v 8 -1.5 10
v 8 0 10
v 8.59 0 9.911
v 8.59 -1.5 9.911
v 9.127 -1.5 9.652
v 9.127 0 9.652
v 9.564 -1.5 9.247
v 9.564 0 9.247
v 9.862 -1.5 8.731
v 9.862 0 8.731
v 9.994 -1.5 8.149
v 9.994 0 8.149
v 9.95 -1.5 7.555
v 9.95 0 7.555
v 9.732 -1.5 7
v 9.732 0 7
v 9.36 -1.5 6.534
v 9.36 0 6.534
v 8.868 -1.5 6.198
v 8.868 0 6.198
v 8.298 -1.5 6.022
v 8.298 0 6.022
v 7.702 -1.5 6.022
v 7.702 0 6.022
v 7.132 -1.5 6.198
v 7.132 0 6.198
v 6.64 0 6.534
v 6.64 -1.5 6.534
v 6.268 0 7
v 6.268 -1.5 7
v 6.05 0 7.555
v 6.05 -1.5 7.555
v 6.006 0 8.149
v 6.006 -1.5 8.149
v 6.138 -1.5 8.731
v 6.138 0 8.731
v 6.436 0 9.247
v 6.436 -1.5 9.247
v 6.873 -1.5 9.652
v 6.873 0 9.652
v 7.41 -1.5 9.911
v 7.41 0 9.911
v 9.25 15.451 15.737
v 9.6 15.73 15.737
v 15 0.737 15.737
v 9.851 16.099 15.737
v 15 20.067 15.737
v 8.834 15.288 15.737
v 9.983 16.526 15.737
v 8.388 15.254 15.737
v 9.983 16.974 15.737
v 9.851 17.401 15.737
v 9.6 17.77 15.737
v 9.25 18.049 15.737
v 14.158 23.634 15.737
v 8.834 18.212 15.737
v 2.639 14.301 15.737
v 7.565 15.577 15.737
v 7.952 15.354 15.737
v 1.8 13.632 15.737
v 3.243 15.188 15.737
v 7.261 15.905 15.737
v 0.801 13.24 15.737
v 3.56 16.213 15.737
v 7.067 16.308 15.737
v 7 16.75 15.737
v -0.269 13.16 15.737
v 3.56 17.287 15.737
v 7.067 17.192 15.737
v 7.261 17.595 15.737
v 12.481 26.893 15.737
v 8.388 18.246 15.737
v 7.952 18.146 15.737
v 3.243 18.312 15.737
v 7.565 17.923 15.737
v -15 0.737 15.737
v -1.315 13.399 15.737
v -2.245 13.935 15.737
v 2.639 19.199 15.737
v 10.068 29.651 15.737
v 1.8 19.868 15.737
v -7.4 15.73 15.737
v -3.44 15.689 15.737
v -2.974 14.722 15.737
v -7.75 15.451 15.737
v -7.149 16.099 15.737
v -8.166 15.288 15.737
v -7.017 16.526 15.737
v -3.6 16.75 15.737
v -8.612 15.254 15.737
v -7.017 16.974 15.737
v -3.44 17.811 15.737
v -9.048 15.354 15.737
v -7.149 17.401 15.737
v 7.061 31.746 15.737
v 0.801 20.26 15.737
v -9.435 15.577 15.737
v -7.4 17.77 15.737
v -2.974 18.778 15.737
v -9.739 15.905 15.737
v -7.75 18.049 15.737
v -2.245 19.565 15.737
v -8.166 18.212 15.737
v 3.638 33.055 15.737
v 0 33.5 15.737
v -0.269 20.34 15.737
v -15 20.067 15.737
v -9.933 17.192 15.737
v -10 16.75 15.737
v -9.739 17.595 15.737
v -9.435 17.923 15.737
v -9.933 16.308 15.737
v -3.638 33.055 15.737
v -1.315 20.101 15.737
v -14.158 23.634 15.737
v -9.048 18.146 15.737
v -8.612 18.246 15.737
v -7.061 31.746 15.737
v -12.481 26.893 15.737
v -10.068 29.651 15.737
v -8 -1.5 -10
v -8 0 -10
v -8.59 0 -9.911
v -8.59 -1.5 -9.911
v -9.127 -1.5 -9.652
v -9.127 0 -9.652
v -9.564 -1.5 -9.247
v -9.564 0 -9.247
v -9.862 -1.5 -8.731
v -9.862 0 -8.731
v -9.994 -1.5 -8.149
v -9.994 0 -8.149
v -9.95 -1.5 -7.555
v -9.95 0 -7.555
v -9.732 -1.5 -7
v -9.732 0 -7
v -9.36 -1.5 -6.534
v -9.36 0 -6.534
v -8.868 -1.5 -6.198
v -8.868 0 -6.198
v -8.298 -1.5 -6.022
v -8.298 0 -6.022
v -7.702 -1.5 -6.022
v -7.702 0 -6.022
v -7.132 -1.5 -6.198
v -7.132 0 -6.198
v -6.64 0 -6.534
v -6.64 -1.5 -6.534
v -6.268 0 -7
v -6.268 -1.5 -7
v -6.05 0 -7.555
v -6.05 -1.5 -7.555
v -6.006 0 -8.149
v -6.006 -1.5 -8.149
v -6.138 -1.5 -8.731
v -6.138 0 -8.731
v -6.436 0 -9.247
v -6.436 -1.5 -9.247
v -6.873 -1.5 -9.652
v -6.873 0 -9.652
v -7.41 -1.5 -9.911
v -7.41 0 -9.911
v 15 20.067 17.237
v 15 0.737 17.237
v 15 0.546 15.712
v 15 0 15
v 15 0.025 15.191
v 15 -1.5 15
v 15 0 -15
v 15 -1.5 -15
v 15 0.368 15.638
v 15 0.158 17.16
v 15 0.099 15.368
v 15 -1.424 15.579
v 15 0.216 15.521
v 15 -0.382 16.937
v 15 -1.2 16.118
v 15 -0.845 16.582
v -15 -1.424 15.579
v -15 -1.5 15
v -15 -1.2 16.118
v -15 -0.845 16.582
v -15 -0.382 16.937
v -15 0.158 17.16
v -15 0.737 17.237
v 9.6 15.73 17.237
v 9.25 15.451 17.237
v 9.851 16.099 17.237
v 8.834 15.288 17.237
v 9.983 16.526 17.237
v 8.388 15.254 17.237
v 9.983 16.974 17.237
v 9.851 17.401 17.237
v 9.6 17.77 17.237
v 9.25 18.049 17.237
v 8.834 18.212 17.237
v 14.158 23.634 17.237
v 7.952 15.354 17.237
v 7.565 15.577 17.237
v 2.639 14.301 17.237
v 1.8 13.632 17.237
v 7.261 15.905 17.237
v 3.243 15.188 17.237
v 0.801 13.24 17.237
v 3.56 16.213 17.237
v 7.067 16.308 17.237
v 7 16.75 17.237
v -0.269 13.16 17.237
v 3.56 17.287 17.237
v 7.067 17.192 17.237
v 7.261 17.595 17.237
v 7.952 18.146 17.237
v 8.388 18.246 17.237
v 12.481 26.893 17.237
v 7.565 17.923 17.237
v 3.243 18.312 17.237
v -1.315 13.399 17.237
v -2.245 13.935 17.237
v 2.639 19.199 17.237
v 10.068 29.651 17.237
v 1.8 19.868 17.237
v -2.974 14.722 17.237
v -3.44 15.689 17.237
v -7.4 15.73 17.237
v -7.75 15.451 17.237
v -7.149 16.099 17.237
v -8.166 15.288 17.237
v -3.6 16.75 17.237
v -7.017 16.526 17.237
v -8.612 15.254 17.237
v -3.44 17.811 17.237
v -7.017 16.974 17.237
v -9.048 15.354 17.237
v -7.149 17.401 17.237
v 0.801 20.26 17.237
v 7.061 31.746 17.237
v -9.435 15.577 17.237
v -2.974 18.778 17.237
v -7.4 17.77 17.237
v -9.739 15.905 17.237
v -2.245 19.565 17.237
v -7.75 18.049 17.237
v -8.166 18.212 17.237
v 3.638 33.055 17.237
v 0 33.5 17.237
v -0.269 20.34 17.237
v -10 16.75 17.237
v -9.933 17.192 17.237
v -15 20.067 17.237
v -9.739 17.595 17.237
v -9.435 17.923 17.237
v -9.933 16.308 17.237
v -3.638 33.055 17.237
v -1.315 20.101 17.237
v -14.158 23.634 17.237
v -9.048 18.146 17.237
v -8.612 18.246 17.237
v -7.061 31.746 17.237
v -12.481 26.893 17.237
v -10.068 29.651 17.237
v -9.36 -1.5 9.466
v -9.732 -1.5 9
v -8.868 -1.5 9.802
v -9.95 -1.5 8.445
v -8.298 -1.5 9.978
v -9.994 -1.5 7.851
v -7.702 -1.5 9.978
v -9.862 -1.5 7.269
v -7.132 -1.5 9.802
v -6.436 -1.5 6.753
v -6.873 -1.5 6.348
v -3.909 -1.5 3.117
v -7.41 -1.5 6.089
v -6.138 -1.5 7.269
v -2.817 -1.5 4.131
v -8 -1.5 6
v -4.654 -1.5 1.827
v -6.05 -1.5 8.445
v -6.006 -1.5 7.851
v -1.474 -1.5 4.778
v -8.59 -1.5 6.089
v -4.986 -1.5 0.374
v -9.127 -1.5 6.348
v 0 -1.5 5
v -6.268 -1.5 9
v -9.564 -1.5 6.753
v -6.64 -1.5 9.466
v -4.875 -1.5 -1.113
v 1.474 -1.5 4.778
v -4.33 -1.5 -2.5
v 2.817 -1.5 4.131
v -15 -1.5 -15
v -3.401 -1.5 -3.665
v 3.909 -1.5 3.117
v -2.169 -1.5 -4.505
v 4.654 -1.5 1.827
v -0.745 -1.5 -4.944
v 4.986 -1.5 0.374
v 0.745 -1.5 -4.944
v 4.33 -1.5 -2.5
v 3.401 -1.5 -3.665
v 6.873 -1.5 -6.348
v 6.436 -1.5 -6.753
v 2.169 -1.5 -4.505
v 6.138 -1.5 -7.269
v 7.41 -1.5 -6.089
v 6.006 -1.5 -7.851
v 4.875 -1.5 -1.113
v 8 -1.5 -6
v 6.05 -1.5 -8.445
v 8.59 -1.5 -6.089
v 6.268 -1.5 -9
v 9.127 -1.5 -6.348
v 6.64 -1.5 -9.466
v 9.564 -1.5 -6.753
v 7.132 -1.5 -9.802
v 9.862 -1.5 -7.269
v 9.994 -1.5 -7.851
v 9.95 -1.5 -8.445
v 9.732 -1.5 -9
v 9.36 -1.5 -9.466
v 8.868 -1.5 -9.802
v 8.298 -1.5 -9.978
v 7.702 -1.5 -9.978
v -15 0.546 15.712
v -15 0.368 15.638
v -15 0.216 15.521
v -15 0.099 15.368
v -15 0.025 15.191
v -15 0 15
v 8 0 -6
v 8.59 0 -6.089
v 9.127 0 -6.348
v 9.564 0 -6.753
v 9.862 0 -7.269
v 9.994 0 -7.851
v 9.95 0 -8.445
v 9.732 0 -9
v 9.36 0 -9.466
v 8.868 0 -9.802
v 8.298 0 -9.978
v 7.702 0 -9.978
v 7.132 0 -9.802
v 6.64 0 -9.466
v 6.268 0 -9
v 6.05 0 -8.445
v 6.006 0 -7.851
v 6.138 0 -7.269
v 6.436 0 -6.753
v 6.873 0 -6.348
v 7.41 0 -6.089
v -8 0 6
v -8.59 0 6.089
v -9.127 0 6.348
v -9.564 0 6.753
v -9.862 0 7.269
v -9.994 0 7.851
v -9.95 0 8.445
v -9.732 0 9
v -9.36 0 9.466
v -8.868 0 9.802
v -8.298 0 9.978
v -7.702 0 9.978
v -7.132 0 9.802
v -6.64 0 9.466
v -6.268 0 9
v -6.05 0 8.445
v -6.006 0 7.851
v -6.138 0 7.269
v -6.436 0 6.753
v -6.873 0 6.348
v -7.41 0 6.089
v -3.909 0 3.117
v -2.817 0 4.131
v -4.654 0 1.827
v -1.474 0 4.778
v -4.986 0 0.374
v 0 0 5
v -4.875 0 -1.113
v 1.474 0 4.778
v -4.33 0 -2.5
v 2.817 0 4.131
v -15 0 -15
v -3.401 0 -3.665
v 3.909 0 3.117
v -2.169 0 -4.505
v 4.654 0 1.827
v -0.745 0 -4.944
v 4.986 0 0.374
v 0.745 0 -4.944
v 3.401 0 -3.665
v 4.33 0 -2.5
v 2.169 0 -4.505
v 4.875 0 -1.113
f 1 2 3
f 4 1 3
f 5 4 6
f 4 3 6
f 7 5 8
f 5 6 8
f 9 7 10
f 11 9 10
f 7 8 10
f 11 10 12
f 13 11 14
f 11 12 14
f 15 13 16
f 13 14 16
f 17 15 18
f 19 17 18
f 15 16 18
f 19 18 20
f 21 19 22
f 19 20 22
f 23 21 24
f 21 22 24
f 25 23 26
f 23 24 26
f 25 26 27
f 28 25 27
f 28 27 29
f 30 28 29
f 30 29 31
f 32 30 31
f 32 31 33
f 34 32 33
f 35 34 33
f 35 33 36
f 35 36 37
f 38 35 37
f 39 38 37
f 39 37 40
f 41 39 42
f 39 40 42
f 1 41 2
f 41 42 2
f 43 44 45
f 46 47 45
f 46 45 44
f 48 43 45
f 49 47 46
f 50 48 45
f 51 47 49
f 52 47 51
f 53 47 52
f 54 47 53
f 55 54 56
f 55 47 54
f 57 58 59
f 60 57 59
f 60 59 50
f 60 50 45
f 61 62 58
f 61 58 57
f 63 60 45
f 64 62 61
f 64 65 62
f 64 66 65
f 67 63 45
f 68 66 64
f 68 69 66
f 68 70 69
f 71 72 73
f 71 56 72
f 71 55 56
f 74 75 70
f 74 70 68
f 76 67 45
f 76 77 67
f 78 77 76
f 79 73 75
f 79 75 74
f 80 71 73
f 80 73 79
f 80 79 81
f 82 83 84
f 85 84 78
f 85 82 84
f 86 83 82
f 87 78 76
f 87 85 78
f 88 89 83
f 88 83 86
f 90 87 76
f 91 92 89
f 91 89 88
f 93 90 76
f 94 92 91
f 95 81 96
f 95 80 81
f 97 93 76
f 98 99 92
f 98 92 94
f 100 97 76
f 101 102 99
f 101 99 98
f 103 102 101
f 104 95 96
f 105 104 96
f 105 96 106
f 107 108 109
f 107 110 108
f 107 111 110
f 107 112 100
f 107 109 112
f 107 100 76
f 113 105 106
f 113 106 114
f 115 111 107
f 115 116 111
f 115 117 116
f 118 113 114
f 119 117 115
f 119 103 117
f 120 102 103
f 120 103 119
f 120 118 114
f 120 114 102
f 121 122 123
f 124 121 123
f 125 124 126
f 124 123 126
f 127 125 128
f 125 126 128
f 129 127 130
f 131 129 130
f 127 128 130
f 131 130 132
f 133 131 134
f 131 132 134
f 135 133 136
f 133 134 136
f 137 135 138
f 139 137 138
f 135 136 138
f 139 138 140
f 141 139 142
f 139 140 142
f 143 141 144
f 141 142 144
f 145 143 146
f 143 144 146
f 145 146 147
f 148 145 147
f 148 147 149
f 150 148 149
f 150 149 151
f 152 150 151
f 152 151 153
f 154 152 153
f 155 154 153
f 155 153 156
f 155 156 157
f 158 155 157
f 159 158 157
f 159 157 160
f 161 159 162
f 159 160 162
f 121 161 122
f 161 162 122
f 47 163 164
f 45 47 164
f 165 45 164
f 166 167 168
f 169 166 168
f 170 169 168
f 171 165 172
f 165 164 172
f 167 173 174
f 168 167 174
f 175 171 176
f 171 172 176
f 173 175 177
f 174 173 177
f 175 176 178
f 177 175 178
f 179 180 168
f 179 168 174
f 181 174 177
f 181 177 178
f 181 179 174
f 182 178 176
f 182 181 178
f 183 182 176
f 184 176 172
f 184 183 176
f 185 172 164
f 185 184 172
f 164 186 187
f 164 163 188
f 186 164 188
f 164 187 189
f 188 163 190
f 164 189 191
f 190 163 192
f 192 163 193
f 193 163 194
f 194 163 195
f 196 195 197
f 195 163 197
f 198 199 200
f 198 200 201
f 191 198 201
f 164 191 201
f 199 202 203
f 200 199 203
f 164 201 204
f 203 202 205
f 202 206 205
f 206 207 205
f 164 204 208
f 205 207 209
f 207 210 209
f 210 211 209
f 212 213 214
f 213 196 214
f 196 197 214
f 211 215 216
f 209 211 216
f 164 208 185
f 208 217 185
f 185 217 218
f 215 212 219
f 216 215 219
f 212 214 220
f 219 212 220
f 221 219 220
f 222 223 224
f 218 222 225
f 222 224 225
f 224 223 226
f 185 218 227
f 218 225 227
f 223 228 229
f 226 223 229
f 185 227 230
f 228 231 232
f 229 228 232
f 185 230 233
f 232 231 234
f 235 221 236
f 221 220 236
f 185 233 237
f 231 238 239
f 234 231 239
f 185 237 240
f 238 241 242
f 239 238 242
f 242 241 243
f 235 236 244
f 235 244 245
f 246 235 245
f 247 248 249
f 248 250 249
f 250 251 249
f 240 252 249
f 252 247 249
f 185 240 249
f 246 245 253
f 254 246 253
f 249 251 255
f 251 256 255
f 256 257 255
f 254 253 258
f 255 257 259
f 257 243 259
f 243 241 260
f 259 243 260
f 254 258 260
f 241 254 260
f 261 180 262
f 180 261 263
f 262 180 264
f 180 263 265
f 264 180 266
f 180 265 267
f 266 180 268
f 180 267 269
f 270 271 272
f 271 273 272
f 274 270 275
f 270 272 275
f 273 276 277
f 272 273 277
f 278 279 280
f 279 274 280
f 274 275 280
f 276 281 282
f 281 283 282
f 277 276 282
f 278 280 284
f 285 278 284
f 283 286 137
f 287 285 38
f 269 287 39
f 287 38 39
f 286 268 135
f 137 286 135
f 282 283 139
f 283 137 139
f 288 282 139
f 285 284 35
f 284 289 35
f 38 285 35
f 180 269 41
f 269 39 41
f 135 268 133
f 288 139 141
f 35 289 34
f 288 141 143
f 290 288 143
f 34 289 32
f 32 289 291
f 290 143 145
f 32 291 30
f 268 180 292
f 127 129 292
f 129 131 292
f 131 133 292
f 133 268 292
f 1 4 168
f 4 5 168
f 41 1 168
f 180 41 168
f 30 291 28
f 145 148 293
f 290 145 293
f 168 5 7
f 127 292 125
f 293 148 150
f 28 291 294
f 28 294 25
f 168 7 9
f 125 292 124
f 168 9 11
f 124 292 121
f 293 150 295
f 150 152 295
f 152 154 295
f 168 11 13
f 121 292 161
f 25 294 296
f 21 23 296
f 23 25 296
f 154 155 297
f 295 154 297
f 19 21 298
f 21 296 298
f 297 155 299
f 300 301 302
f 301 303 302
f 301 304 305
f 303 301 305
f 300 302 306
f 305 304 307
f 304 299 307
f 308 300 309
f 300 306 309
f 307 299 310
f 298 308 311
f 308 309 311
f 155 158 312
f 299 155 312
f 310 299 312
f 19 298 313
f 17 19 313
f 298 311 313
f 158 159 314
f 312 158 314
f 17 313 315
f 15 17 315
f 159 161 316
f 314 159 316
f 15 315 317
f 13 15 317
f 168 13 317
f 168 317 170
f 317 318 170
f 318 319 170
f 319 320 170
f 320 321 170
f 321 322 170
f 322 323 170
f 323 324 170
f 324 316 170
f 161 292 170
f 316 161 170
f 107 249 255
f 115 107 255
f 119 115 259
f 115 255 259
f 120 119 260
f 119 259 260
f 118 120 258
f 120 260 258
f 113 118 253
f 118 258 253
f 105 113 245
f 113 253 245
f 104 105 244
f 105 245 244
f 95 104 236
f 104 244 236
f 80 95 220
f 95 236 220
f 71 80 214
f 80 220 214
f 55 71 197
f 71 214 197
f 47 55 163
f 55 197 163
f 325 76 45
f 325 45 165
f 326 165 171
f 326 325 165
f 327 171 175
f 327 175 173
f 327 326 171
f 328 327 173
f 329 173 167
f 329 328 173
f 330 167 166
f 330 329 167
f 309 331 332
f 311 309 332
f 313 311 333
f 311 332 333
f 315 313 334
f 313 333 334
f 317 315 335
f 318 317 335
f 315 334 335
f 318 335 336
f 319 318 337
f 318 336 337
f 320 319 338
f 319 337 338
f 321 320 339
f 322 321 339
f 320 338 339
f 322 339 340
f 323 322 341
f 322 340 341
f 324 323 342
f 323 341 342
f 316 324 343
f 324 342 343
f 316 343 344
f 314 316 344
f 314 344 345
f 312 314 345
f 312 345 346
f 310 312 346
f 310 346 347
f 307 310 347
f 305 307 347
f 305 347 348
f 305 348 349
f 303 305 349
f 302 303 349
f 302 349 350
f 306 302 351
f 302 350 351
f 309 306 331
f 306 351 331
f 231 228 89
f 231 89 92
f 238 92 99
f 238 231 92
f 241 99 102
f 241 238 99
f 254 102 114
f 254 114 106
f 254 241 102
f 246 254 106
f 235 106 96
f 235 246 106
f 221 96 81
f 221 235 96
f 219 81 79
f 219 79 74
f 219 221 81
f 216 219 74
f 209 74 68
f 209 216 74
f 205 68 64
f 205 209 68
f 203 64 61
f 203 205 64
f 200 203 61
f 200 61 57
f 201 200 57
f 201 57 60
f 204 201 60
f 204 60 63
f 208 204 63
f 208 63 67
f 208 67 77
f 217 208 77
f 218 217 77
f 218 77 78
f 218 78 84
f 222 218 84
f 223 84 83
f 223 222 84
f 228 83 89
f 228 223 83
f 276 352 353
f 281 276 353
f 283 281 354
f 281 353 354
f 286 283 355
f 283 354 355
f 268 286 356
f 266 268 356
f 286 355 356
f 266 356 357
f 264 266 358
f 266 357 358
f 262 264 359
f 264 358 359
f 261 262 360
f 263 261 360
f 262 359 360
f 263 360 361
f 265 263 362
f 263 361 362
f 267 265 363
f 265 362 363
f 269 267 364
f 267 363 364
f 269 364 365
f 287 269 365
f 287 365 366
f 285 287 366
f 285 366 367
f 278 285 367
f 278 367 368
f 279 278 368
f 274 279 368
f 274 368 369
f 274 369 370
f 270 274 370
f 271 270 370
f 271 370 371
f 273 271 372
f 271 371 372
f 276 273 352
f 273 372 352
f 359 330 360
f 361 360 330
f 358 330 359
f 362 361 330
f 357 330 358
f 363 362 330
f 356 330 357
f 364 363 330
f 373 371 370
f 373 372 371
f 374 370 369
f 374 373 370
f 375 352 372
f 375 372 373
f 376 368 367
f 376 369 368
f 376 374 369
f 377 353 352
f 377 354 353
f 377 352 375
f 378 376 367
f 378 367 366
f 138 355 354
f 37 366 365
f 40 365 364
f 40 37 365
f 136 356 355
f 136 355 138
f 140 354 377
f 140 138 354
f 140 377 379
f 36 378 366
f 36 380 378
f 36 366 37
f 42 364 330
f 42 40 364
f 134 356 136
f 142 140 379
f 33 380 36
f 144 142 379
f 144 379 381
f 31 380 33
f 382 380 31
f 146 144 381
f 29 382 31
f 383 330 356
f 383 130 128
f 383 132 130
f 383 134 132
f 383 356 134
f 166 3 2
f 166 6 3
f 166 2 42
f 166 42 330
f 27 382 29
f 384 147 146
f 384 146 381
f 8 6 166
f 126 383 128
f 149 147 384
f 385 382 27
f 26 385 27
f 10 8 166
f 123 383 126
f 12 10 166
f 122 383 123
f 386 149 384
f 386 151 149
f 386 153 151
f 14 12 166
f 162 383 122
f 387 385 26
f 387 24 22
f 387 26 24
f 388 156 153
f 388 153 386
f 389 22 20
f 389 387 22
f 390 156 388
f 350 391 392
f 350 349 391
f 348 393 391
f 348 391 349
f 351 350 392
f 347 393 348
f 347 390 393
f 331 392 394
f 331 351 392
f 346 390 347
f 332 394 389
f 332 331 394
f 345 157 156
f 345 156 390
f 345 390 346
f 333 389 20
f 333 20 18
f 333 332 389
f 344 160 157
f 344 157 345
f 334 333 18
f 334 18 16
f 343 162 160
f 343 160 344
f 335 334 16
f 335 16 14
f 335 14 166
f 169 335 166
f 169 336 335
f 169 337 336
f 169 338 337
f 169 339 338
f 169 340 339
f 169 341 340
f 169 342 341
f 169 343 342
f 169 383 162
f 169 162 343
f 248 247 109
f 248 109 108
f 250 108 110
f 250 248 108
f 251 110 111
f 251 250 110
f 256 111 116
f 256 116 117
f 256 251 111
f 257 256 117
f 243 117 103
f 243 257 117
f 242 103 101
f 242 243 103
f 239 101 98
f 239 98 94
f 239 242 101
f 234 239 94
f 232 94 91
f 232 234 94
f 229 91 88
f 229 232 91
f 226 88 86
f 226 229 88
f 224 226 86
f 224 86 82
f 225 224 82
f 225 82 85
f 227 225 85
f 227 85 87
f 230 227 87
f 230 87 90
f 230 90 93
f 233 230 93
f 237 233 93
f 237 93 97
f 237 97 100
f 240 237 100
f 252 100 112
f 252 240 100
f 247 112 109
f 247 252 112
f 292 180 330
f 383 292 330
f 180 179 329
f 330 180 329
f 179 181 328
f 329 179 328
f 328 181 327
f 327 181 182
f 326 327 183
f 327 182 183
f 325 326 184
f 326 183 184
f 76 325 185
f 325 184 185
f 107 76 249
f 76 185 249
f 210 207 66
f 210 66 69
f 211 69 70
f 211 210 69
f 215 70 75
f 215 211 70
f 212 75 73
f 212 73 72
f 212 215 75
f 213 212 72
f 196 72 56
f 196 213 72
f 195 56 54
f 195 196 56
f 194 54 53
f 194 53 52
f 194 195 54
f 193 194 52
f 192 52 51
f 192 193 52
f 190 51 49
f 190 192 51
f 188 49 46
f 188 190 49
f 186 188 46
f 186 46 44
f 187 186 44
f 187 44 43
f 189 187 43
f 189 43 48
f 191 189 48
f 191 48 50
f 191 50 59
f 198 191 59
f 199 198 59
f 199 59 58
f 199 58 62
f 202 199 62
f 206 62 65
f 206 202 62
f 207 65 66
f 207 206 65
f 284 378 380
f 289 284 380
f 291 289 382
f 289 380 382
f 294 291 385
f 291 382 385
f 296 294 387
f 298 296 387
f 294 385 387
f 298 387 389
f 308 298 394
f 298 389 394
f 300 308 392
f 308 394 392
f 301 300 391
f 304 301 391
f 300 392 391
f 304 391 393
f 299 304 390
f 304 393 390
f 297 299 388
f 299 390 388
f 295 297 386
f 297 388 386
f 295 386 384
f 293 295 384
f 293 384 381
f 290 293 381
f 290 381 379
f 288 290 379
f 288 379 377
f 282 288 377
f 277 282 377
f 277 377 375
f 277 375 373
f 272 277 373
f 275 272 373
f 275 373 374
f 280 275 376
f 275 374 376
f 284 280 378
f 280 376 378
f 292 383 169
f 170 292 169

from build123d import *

# Parameters (mm, degrees)
SKETCH1_W                = 30
SKETCH1_H                = 30
SKETCH1_R                = 5
SKETCH1_R_2              = 2
BASE_FLANGE1_DEPTH       = 1.5
EDGE_FLANGE1_DEPTH       = 30
EDGE_FLANGE1_START       = -1.5
EDGE_FLANGE1_PROFILE_R   = 1.5
EDGE_FLANGE1_PROFILE_R_2 = 3.6
EDGE_FLANGE1_FLAT_DEPTH  = 1.5


# Sheet-metal steps are written as plain solids
with BuildPart() as part:
    # Sketch1 → Base-Flange1 (new body)
    with BuildSketch(Plane(origin=(0, 0, 0), x_dir=(1, 0, 0), z_dir=(0, 1, 0))):
        Rectangle(SKETCH1_W, SKETCH1_H)
        with Locations(Location((0, 0, 0), (0, 0, 270))):
            Circle(SKETCH1_R, mode=Mode.SUBTRACT)
        with Locations(Location((8, 8, 0), (0, 0, 270))):
            Circle(SKETCH1_R_2, mode=Mode.SUBTRACT)
        with Locations(Location((8, -8, 0), (0, 0, 270))):
            Circle(SKETCH1_R_2, mode=Mode.SUBTRACT)
        with Locations(Location((-8, -8, 0), (0, 0, 90))):
            Circle(SKETCH1_R_2, mode=Mode.SUBTRACT)
        with Locations(Location((-8, 8, 0), (0, 0, 90))):
            Circle(SKETCH1_R_2, mode=Mode.SUBTRACT)
    extrude(amount=-BASE_FLANGE1_DEPTH)

    # Edge-Flange1 bend section (across the edge) → Edge-Flange1 (add)
    with BuildSketch(Plane(origin=(-15, 0, 15.7366), x_dir=(0, 0, -1), z_dir=(1, 0, 0))):
        with BuildLine():
            Line((-1.5, 0.7366), (0, 0.7366))
            ThreePointArc((0, 0.7366), (0.215745145, 0.215745145), (0.7366, 0))
            Line((0.7366, 0), (0.7366, -1.5))
            ThreePointArc((0.7366, -1.5), (-0.844915027, -0.844915027), (-1.5, 0.7366))
        make_face()
    extrude(amount=EDGE_FLANGE1_DEPTH)

    # Edge-Flange1 profile (on flange) → Edge-Flange1 flat (add)
    with BuildSketch(Plane(origin=(0, 0, 15.7366), x_dir=(-1, 0, 0), z_dir=(0, 0, -1)).offset(EDGE_FLANGE1_START)):
        with BuildLine():
            ThreePointArc((15, 20.067164179), (0, 33.5), (-15, 20.067164179))
            Line((-15, 20.067164179), (-15, 0.7366))
            Line((-15, 0.7366), (15, 0.7366))
            Line((15, 0.7366), (15, 20.067164179))
        make_face()
        with Locations((8.5, 16.75)):
            Circle(EDGE_FLANGE1_PROFILE_R, mode=Mode.SUBTRACT)
        with Locations((0, 16.75)):
            Circle(EDGE_FLANGE1_PROFILE_R_2, mode=Mode.SUBTRACT)
        with Locations((-8.5, 16.75)):
            Circle(EDGE_FLANGE1_PROFILE_R, mode=Mode.SUBTRACT)
    extrude(amount=EDGE_FLANGE1_FLAT_DEPTH)


solid = part.part
